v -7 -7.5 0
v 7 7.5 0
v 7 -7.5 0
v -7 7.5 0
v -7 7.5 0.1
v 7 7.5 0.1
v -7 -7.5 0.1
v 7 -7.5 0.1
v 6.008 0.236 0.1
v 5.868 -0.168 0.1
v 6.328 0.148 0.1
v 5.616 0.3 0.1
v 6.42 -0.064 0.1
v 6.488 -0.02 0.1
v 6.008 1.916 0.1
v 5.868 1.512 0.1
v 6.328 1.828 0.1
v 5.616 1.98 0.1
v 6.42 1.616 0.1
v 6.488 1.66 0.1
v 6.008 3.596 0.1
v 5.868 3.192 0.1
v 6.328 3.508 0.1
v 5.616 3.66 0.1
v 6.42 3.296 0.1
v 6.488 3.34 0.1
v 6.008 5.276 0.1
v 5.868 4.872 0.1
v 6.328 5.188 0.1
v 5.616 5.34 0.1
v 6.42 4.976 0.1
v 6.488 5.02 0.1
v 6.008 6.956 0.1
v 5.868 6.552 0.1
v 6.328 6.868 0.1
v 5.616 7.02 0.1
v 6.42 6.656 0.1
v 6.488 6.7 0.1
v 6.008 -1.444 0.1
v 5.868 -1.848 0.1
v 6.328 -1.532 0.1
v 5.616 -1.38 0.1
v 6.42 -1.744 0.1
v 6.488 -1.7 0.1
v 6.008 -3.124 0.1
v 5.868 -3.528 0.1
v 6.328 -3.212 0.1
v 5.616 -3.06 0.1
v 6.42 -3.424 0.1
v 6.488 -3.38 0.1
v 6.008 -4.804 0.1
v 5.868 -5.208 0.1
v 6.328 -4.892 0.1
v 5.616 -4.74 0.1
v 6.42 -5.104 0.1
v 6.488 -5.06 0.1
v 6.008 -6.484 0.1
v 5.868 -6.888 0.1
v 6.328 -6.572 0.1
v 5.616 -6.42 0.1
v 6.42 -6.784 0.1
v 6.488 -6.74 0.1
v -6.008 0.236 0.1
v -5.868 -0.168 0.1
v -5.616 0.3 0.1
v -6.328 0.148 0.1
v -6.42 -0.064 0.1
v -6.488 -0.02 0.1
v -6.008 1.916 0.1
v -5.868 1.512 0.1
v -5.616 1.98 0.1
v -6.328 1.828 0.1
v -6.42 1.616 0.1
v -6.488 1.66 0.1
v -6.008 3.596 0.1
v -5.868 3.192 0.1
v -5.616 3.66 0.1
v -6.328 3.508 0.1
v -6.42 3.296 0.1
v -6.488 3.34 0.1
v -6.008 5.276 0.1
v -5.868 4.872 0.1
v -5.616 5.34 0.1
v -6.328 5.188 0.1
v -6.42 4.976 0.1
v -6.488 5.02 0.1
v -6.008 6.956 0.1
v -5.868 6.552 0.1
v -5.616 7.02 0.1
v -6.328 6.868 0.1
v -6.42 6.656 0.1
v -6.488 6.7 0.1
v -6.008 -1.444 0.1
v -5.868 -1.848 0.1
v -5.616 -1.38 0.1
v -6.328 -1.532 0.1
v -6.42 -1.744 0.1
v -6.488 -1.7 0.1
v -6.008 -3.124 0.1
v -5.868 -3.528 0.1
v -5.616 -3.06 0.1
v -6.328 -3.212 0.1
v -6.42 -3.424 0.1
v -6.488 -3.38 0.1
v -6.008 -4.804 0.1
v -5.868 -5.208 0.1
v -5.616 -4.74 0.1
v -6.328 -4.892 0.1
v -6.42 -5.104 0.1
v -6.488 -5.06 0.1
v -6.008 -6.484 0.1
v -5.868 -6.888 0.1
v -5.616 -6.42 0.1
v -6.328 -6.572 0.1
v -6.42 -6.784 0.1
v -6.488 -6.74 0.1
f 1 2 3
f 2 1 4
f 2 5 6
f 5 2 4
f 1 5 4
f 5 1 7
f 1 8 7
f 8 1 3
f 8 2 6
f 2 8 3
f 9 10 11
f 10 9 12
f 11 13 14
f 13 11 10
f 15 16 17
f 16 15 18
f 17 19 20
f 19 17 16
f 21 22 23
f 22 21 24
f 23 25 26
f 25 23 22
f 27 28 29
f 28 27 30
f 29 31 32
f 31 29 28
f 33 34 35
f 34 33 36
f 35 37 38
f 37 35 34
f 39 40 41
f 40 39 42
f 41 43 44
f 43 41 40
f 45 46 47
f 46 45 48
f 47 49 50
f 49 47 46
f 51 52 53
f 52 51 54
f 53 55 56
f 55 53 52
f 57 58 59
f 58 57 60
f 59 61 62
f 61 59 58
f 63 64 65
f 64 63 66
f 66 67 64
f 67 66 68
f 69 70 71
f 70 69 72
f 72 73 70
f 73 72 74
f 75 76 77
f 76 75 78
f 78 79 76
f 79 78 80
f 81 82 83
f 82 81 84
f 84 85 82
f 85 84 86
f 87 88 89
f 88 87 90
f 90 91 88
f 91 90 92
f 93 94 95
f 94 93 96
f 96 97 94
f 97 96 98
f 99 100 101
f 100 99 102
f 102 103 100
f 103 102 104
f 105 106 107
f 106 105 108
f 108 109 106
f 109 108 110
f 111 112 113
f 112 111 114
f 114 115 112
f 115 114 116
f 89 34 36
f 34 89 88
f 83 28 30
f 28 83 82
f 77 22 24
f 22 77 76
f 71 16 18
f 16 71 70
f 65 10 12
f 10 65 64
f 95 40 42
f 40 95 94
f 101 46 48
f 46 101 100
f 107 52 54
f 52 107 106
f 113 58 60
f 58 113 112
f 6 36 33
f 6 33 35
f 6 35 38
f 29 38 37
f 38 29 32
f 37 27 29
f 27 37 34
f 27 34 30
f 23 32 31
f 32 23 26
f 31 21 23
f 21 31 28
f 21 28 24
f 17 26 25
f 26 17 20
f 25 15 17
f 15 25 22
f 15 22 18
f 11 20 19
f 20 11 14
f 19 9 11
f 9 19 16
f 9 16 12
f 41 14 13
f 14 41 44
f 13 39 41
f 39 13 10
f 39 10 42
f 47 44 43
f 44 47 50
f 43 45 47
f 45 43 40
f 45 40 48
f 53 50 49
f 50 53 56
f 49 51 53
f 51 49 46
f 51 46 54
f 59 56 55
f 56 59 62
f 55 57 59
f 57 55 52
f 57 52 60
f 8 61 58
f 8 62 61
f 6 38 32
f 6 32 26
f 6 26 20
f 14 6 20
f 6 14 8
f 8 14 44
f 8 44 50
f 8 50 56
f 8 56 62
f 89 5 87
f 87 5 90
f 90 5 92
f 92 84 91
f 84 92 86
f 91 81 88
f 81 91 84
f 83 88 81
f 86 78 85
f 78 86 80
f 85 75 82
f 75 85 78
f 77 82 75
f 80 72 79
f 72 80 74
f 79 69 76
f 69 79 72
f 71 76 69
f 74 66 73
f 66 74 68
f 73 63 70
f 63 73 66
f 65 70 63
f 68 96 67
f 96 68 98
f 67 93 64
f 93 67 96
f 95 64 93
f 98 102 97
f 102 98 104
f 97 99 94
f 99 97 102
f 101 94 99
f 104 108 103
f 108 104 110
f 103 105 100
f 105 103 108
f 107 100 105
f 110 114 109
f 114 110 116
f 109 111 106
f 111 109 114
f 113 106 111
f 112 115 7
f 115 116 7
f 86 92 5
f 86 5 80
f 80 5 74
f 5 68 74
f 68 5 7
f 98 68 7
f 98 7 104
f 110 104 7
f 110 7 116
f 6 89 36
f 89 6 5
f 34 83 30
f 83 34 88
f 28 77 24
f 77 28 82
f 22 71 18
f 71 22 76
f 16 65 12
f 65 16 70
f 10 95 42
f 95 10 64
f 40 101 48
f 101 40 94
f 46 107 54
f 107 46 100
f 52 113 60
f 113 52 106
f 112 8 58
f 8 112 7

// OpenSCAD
// file: ../p/box5-12.scad
use <../lib.scad>
function ldraw_lib__box5_12() = [
// 0 Box with 5 Faces without Any Edges
// 0 Name: box5-12.dat
// 0 Author: Chris Dee [cwdee]
// 0 !LDRAW_ORG Primitive UPDATE 2009-02
// 0 !LICENSE Licensed under CC BY 4.0 : see CAreadme.txt
// 
// 0 BFC CERTIFY CCW
  [0,"BFC","CERTIFY"],
  [0,"BFC","CCW"],
// 
// 0 !HISTORY 2009-09-03 [PTadmin] Official Update 2009-02
// 
// 
// 4 16 1 1 1 1 1 -1 -1 1 -1 -1 1 1
  [4,16,1,1,1,1,1,-1,-1,1,-1,-1,1,1],
// 4 16 -1 0 1 1 0 1 1 1 1 -1 1 1
  [4,16,-1,0,1,1,0,1,1,1,1,-1,1,1],
// 4 16 -1 0 -1 -1 0 1 -1 1 1 -1 1 -1
  [4,16,-1,0,-1,-1,0,1,-1,1,1,-1,1,-1],
// 4 16 1 0 -1 -1 0 -1 -1 1 -1 1 1 -1
  [4,16,1,0,-1,-1,0,-1,-1,1,-1,1,1,-1],
// 4 16 1 0 1 1 0 -1 1 1 -1 1 1 1
  [4,16,1,0,1,1,0,-1,1,1,-1,1,1,1],
// 0
];
module ldraw_lib__box5_12(step=0, col=false, unit=2/5, alt=false, line=0.2, solid=!$preview)
    makepoly(ldraw_lib__box5_12(), step=step, col=col, unit=unit, alt=alt, line=line, solid=solid);
ldraw_lib__box5_12(line=0.2);
// main file
use <../lib.scad>
use <../p/box5-12.scad>
function ldraw_lib__6296256f() = [
// 0 Sticker  1.9 x  1.8 with 9 Air Outlet Gills
// 0 Name: 6296256f.dat
// 0 Author: Magnus Forsberg [MagFors]
// 0 !LDRAW_ORG Part UPDATE 2020-03
// 0 !LICENSE Licensed under CC BY 4.0 : see CAreadme.txt
// 
// 0 BFC CERTIFY CCW
  [0,"BFC","CERTIFY"],
  [0,"BFC","CCW"],
// 
// 0 !KEYWORDS 500, Cinquecento, FIAT, Nuova, set 10271
// 
// 0 !HISTORY 2020-12-29 [PTadmin] Official Update 2020-03
// 
// 
// 1 16 0 -.25 0 17.5 0 0 0 .25 0 0 0 18.75 box5-12.dat
  [1,16,0,-.25,0,17.5,0,0,0,.25,0,0,0,18.75, ldraw_lib__box5_12()],
// 4 0 15.02 -.25 .59 14.04 -.25 .75 14.67 -.25 -.42 15.82 -.25 .37
  [4,0,15.02,-.25,.59,14.04,-.25,.75,14.67,-.25,-.42,15.82,-.25,.37],
// 4 0 15.82 -.25 .37 14.67 -.25 -.42 16.05 -.25 -.16 16.22 -.25 -.05
  [4,0,15.82,-.25,.37,14.67,-.25,-.42,16.05,-.25,-.16,16.22,-.25,-.05],
// 4 0 15.02 -.25 4.79 14.04 -.25 4.95 14.67 -.25 3.78 15.82 -.25 4.57
  [4,0,15.02,-.25,4.79,14.04,-.25,4.95,14.67,-.25,3.78,15.82,-.25,4.57],
// 4 0 15.82 -.25 4.57 14.67 -.25 3.78 16.05 -.25 4.04 16.22 -.25 4.15
  [4,0,15.82,-.25,4.57,14.67,-.25,3.78,16.05,-.25,4.04,16.22,-.25,4.15],
// 4 0 15.02 -.25 8.99 14.04 -.25 9.15 14.67 -.25 7.98 15.82 -.25 8.77
  [4,0,15.02,-.25,8.99,14.04,-.25,9.15,14.67,-.25,7.98,15.82,-.25,8.77],
// 4 0 15.82 -.25 8.77 14.67 -.25 7.98 16.05 -.25 8.24 16.22 -.25 8.35
  [4,0,15.82,-.25,8.77,14.67,-.25,7.98,16.05,-.25,8.24,16.22,-.25,8.35],
// 4 0 15.02 -.25 13.19 14.04 -.25 13.35 14.67 -.25 12.18 15.82 -.25 12.97
  [4,0,15.02,-.25,13.19,14.04,-.25,13.35,14.67,-.25,12.18,15.82,-.25,12.97],
// 4 0 15.82 -.25 12.97 14.67 -.25 12.18 16.05 -.25 12.44 16.22 -.25 12.55
  [4,0,15.82,-.25,12.97,14.67,-.25,12.18,16.05,-.25,12.44,16.22,-.25,12.55],
// 4 0 15.02 -.25 17.39 14.04 -.25 17.55 14.67 -.25 16.38 15.82 -.25 17.17
  [4,0,15.02,-.25,17.39,14.04,-.25,17.55,14.67,-.25,16.38,15.82,-.25,17.17],
// 4 0 15.82 -.25 17.17 14.67 -.25 16.38 16.05 -.25 16.64 16.22 -.25 16.75
  [4,0,15.82,-.25,17.17,14.67,-.25,16.38,16.05,-.25,16.64,16.22,-.25,16.75],
// 4 0 15.02 -.25 -3.61 14.04 -.25 -3.45 14.67 -.25 -4.62 15.82 -.25 -3.83
  [4,0,15.02,-.25,-3.61,14.04,-.25,-3.45,14.67,-.25,-4.62,15.82,-.25,-3.83],
// 4 0 15.82 -.25 -3.83 14.67 -.25 -4.62 16.05 -.25 -4.36 16.22 -.25 -4.25
  [4,0,15.82,-.25,-3.83,14.67,-.25,-4.62,16.05,-.25,-4.36,16.22,-.25,-4.25],
// 4 0 15.02 -.25 -7.81 14.04 -.25 -7.65 14.67 -.25 -8.82 15.82 -.25 -8.03
  [4,0,15.02,-.25,-7.81,14.04,-.25,-7.65,14.67,-.25,-8.82,15.82,-.25,-8.03],
// 4 0 15.82 -.25 -8.03 14.67 -.25 -8.82 16.05 -.25 -8.56 16.22 -.25 -8.45
  [4,0,15.82,-.25,-8.03,14.67,-.25,-8.82,16.05,-.25,-8.56,16.22,-.25,-8.45],
// 4 0 15.02 -.25 -12.01 14.04 -.25 -11.85 14.67 -.25 -13.02 15.82 -.25 -12.23
  [4,0,15.02,-.25,-12.01,14.04,-.25,-11.85,14.67,-.25,-13.02,15.82,-.25,-12.23],
// 4 0 15.82 -.25 -12.23 14.67 -.25 -13.02 16.05 -.25 -12.76 16.22 -.25 -12.65
  [4,0,15.82,-.25,-12.23,14.67,-.25,-13.02,16.05,-.25,-12.76,16.22,-.25,-12.65],
// 4 0 15.02 -.25 -16.21 14.04 -.25 -16.05 14.67 -.25 -17.22 15.82 -.25 -16.43
  [4,0,15.02,-.25,-16.21,14.04,-.25,-16.05,14.67,-.25,-17.22,15.82,-.25,-16.43],
// 4 0 15.82 -.25 -16.43 14.67 -.25 -17.22 16.05 -.25 -16.96 16.22 -.25 -16.85
  [4,0,15.82,-.25,-16.43,14.67,-.25,-17.22,16.05,-.25,-16.96,16.22,-.25,-16.85],
// 4 0 -14.67 -.25 -.42 -14.04 -.25 .75 -15.02 -.25 .59 -15.82 -.25 .37
  [4,0,-14.67,-.25,-.42,-14.04,-.25,.75,-15.02,-.25,.59,-15.82,-.25,.37],
// 4 0 -16.05 -.25 -.16 -14.67 -.25 -.42 -15.82 -.25 .37 -16.22 -.25 -.05
  [4,0,-16.05,-.25,-.16,-14.67,-.25,-.42,-15.82,-.25,.37,-16.22,-.25,-.05],
// 4 0 -14.67 -.25 3.78 -14.04 -.25 4.95 -15.02 -.25 4.79 -15.82 -.25 4.57
  [4,0,-14.67,-.25,3.78,-14.04,-.25,4.95,-15.02,-.25,4.79,-15.82,-.25,4.57],
// 4 0 -16.05 -.25 4.04 -14.67 -.25 3.78 -15.82 -.25 4.57 -16.22 -.25 4.15
  [4,0,-16.05,-.25,4.04,-14.67,-.25,3.78,-15.82,-.25,4.57,-16.22,-.25,4.15],
// 4 0 -14.67 -.25 7.98 -14.04 -.25 9.15 -15.02 -.25 8.99 -15.82 -.25 8.77
  [4,0,-14.67,-.25,7.98,-14.04,-.25,9.15,-15.02,-.25,8.99,-15.82,-.25,8.77],
// 4 0 -16.05 -.25 8.24 -14.67 -.25 7.98 -15.82 -.25 8.77 -16.22 -.25 8.35
  [4,0,-16.05,-.25,8.24,-14.67,-.25,7.98,-15.82,-.25,8.77,-16.22,-.25,8.35],
// 4 0 -14.67 -.25 12.18 -14.04 -.25 13.35 -15.02 -.25 13.19 -15.82 -.25 12.97
  [4,0,-14.67,-.25,12.18,-14.04,-.25,13.35,-15.02,-.25,13.19,-15.82,-.25,12.97],
// 4 0 -16.05 -.25 12.44 -14.67 -.25 12.18 -15.82 -.25 12.97 -16.22 -.25 12.55
  [4,0,-16.05,-.25,12.44,-14.67,-.25,12.18,-15.82,-.25,12.97,-16.22,-.25,12.55],
// 4 0 -14.67 -.25 16.38 -14.04 -.25 17.55 -15.02 -.25 17.39 -15.82 -.25 17.17
  [4,0,-14.67,-.25,16.38,-14.04,-.25,17.55,-15.02,-.25,17.39,-15.82,-.25,17.17],
// 4 0 -16.05 -.25 16.64 -14.67 -.25 16.38 -15.82 -.25 17.17 -16.22 -.25 16.75
  [4,0,-16.05,-.25,16.64,-14.67,-.25,16.38,-15.82,-.25,17.17,-16.22,-.25,16.75],
// 4 0 -14.67 -.25 -4.62 -14.04 -.25 -3.45 -15.02 -.25 -3.61 -15.82 -.25 -3.83
  [4,0,-14.67,-.25,-4.62,-14.04,-.25,-3.45,-15.02,-.25,-3.61,-15.82,-.25,-3.83],
// 4 0 -16.05 -.25 -4.36 -14.67 -.25 -4.62 -15.82 -.25 -3.83 -16.22 -.25 -4.25
  [4,0,-16.05,-.25,-4.36,-14.67,-.25,-4.62,-15.82,-.25,-3.83,-16.22,-.25,-4.25],
// 4 0 -14.67 -.25 -8.82 -14.04 -.25 -7.65 -15.02 -.25 -7.81 -15.82 -.25 -8.03
  [4,0,-14.67,-.25,-8.82,-14.04,-.25,-7.65,-15.02,-.25,-7.81,-15.82,-.25,-8.03],
// 4 0 -16.05 -.25 -8.56 -14.67 -.25 -8.82 -15.82 -.25 -8.03 -16.22 -.25 -8.45
  [4,0,-16.05,-.25,-8.56,-14.67,-.25,-8.82,-15.82,-.25,-8.03,-16.22,-.25,-8.45],
// 4 0 -14.67 -.25 -13.02 -14.04 -.25 -11.85 -15.02 -.25 -12.01 -15.82 -.25 -12.23
  [4,0,-14.67,-.25,-13.02,-14.04,-.25,-11.85,-15.02,-.25,-12.01,-15.82,-.25,-12.23],
// 4 0 -16.05 -.25 -12.76 -14.67 -.25 -13.02 -15.82 -.25 -12.23 -16.22 -.25 -12.65
  [4,0,-16.05,-.25,-12.76,-14.67,-.25,-13.02,-15.82,-.25,-12.23,-16.22,-.25,-12.65],
// 4 0 -14.67 -.25 -17.22 -14.04 -.25 -16.05 -15.02 -.25 -16.21 -15.82 -.25 -16.43
  [4,0,-14.67,-.25,-17.22,-14.04,-.25,-16.05,-15.02,-.25,-16.21,-15.82,-.25,-16.43],
// 4 0 -16.05 -.25 -16.96 -14.67 -.25 -17.22 -15.82 -.25 -16.43 -16.22 -.25 -16.85
  [4,0,-16.05,-.25,-16.96,-14.67,-.25,-17.22,-15.82,-.25,-16.43,-16.22,-.25,-16.85],
// 4 0 -14.67 -.25 16.38 14.67 -.25 16.38 14.04 -.25 17.55 -14.04 -.25 17.55
  [4,0,-14.67,-.25,16.38,14.67,-.25,16.38,14.04,-.25,17.55,-14.04,-.25,17.55],
// 4 0 14.04 -.25 13.35 -14.04 -.25 13.35 -14.67 -.25 12.18 14.67 -.25 12.18
  [4,0,14.04,-.25,13.35,-14.04,-.25,13.35,-14.67,-.25,12.18,14.67,-.25,12.18],
// 4 0 14.04 -.25 9.15 -14.04 -.25 9.15 -14.67 -.25 7.98 14.67 -.25 7.98
  [4,0,14.04,-.25,9.15,-14.04,-.25,9.15,-14.67,-.25,7.98,14.67,-.25,7.98],
// 4 0 14.04 -.25 4.95 -14.04 -.25 4.95 -14.67 -.25 3.78 14.67 -.25 3.78
  [4,0,14.04,-.25,4.95,-14.04,-.25,4.95,-14.67,-.25,3.78,14.67,-.25,3.78],
// 4 0 14.04 -.25 .75 -14.04 -.25 .75 -14.67 -.25 -.42 14.67 -.25 -.42
  [4,0,14.04,-.25,.75,-14.04,-.25,.75,-14.67,-.25,-.42,14.67,-.25,-.42],
// 4 0 14.04 -.25 -3.45 -14.04 -.25 -3.45 -14.67 -.25 -4.62 14.67 -.25 -4.62
  [4,0,14.04,-.25,-3.45,-14.04,-.25,-3.45,-14.67,-.25,-4.62,14.67,-.25,-4.62],
// 4 0 14.04 -.25 -7.65 -14.04 -.25 -7.65 -14.67 -.25 -8.82 14.67 -.25 -8.82
  [4,0,14.04,-.25,-7.65,-14.04,-.25,-7.65,-14.67,-.25,-8.82,14.67,-.25,-8.82],
// 4 0 14.04 -.25 -11.85 -14.04 -.25 -11.85 -14.67 -.25 -13.02 14.67 -.25 -13.02
  [4,0,14.04,-.25,-11.85,-14.04,-.25,-11.85,-14.67,-.25,-13.02,14.67,-.25,-13.02],
// 4 0 14.04 -.25 -16.05 -14.04 -.25 -16.05 -14.67 -.25 -17.22 14.67 -.25 -17.22
  [4,0,14.04,-.25,-16.05,-14.04,-.25,-16.05,-14.67,-.25,-17.22,14.67,-.25,-17.22],
// 3 226 17.5 -.25 18.75 14.04 -.25 17.55 15.02 -.25 17.39
  [3,226,17.5,-.25,18.75,14.04,-.25,17.55,15.02,-.25,17.39],
// 3 226 17.5 -.25 18.75 15.02 -.25 17.39 15.82 -.25 17.17
  [3,226,17.5,-.25,18.75,15.02,-.25,17.39,15.82,-.25,17.17],
// 3 226 17.5 -.25 18.75 15.82 -.25 17.17 16.22 -.25 16.75
  [3,226,17.5,-.25,18.75,15.82,-.25,17.17,16.22,-.25,16.75],
// 4 226 16.22 -.25 16.75 16.05 -.25 16.64 15.82 -.25 12.97 16.22 -.25 12.55
  [4,226,16.22,-.25,16.75,16.05,-.25,16.64,15.82,-.25,12.97,16.22,-.25,12.55],
// 4 226 16.05 -.25 16.64 14.67 -.25 16.38 15.02 -.25 13.19 15.82 -.25 12.97
  [4,226,16.05,-.25,16.64,14.67,-.25,16.38,15.02,-.25,13.19,15.82,-.25,12.97],
// 3 226 15.02 -.25 13.19 14.67 -.25 16.38 14.04 -.25 13.35
  [3,226,15.02,-.25,13.19,14.67,-.25,16.38,14.04,-.25,13.35],
// 4 226 15.82 -.25 8.77 16.22 -.25 8.35 16.22 -.25 12.55 16.05 -.25 12.44
  [4,226,15.82,-.25,8.77,16.22,-.25,8.35,16.22,-.25,12.55,16.05,-.25,12.44],
// 4 226 15.02 -.25 8.99 15.82 -.25 8.77 16.05 -.25 12.44 14.67 -.25 12.18
  [4,226,15.02,-.25,8.99,15.82,-.25,8.77,16.05,-.25,12.44,14.67,-.25,12.18],
// 3 226 15.02 -.25 8.99 14.67 -.25 12.18 14.04 -.25 9.15
  [3,226,15.02,-.25,8.99,14.67,-.25,12.18,14.04,-.25,9.15],
// 4 226 15.82 -.25 4.57 16.22 -.25 4.15 16.22 -.25 8.35 16.05 -.25 8.24
  [4,226,15.82,-.25,4.57,16.22,-.25,4.15,16.22,-.25,8.35,16.05,-.25,8.24],
// 4 226 15.02 -.25 4.79 15.82 -.25 4.57 16.05 -.25 8.24 14.67 -.25 7.98
  [4,226,15.02,-.25,4.79,15.82,-.25,4.57,16.05,-.25,8.24,14.67,-.25,7.98],
// 3 226 15.02 -.25 4.79 14.67 -.25 7.98 14.04 -.25 4.95
  [3,226,15.02,-.25,4.79,14.67,-.25,7.98,14.04,-.25,4.95],
// 4 226 15.82 -.25 .37 16.22 -.25 -.05 16.22 -.25 4.15 16.05 -.25 4.04
  [4,226,15.82,-.25,.37,16.22,-.25,-.05,16.22,-.25,4.15,16.05,-.25,4.04],
// 4 226 15.02 -.25 .59 15.82 -.25 .37 16.05 -.25 4.04 14.67 -.25 3.78
  [4,226,15.02,-.25,.59,15.82,-.25,.37,16.05,-.25,4.04,14.67,-.25,3.78],
// 3 226 15.02 -.25 .59 14.67 -.25 3.78 14.04 -.25 .75
  [3,226,15.02,-.25,.59,14.67,-.25,3.78,14.04,-.25,.75],
// 4 226 15.82 -.25 -3.83 16.22 -.25 -4.25 16.22 -.25 -.05 16.05 -.25 -.16
  [4,226,15.82,-.25,-3.83,16.22,-.25,-4.25,16.22,-.25,-.05,16.05,-.25,-.16],
// 4 226 15.02 -.25 -3.61 15.82 -.25 -3.83 16.05 -.25 -.16 14.67 -.25 -.42
  [4,226,15.02,-.25,-3.61,15.82,-.25,-3.83,16.05,-.25,-.16,14.67,-.25,-.42],
// 3 226 15.02 -.25 -3.61 14.67 -.25 -.42 14.04 -.25 -3.45
  [3,226,15.02,-.25,-3.61,14.67,-.25,-.42,14.04,-.25,-3.45],
// 4 226 15.82 -.25 -8.03 16.22 -.25 -8.45 16.22 -.25 -4.25 16.05 -.25 -4.36
  [4,226,15.82,-.25,-8.03,16.22,-.25,-8.45,16.22,-.25,-4.25,16.05,-.25,-4.36],
// 4 226 15.02 -.25 -7.81 15.82 -.25 -8.03 16.05 -.25 -4.36 14.67 -.25 -4.62
  [4,226,15.02,-.25,-7.81,15.82,-.25,-8.03,16.05,-.25,-4.36,14.67,-.25,-4.62],
// 3 226 15.02 -.25 -7.81 14.67 -.25 -4.62 14.04 -.25 -7.65
  [3,226,15.02,-.25,-7.81,14.67,-.25,-4.62,14.04,-.25,-7.65],
// 4 226 15.82 -.25 -12.23 16.22 -.25 -12.65 16.22 -.25 -8.45 16.05 -.25 -8.56
  [4,226,15.82,-.25,-12.23,16.22,-.25,-12.65,16.22,-.25,-8.45,16.05,-.25,-8.56],
// 4 226 15.02 -.25 -12.01 15.82 -.25 -12.23 16.05 -.25 -8.56 14.67 -.25 -8.82
  [4,226,15.02,-.25,-12.01,15.82,-.25,-12.23,16.05,-.25,-8.56,14.67,-.25,-8.82],
// 3 226 15.02 -.25 -12.01 14.67 -.25 -8.82 14.04 -.25 -11.85
  [3,226,15.02,-.25,-12.01,14.67,-.25,-8.82,14.04,-.25,-11.85],
// 4 226 15.82 -.25 -16.43 16.22 -.25 -16.85 16.22 -.25 -12.65 16.05 -.25 -12.76
  [4,226,15.82,-.25,-16.43,16.22,-.25,-16.85,16.22,-.25,-12.65,16.05,-.25,-12.76],
// 4 226 15.02 -.25 -16.21 15.82 -.25 -16.43 16.05 -.25 -12.76 14.67 -.25 -13.02
  [4,226,15.02,-.25,-16.21,15.82,-.25,-16.43,16.05,-.25,-12.76,14.67,-.25,-13.02],
// 3 226 15.02 -.25 -16.21 14.67 -.25 -13.02 14.04 -.25 -16.05
  [3,226,15.02,-.25,-16.21,14.67,-.25,-13.02,14.04,-.25,-16.05],
// 3 226 17.5 -.25 -18.75 16.05 -.25 -16.96 14.67 -.25 -17.22
  [3,226,17.5,-.25,-18.75,16.05,-.25,-16.96,14.67,-.25,-17.22],
// 3 226 17.5 -.25 -18.75 16.22 -.25 -16.85 16.05 -.25 -16.96
  [3,226,17.5,-.25,-18.75,16.22,-.25,-16.85,16.05,-.25,-16.96],
// 3 226 17.5 -.25 18.75 16.22 -.25 16.75 16.22 -.25 12.55
  [3,226,17.5,-.25,18.75,16.22,-.25,16.75,16.22,-.25,12.55],
// 3 226 17.5 -.25 18.75 16.22 -.25 12.55 16.22 -.25 8.35
  [3,226,17.5,-.25,18.75,16.22,-.25,12.55,16.22,-.25,8.35],
// 3 226 17.5 -.25 18.75 16.22 -.25 8.35 16.22 -.25 4.15
  [3,226,17.5,-.25,18.75,16.22,-.25,8.35,16.22,-.25,4.15],
// 4 226 17.5 -.25 18.75 16.22 -.25 4.15 16.22 -.25 -.05 17.5 -.25 -18.75
  [4,226,17.5,-.25,18.75,16.22,-.25,4.15,16.22,-.25,-.05,17.5,-.25,-18.75],
// 3 226 17.5 -.25 -18.75 16.22 -.25 -.05 16.22 -.25 -4.25
  [3,226,17.5,-.25,-18.75,16.22,-.25,-.05,16.22,-.25,-4.25],
// 3 226 17.5 -.25 -18.75 16.22 -.25 -4.25 16.22 -.25 -8.45
  [3,226,17.5,-.25,-18.75,16.22,-.25,-4.25,16.22,-.25,-8.45],
// 3 226 17.5 -.25 -18.75 16.22 -.25 -8.45 16.22 -.25 -12.65
  [3,226,17.5,-.25,-18.75,16.22,-.25,-8.45,16.22,-.25,-12.65],
// 3 226 17.5 -.25 -18.75 16.22 -.25 -12.65 16.22 -.25 -16.85
  [3,226,17.5,-.25,-18.75,16.22,-.25,-12.65,16.22,-.25,-16.85],
// 3 226 -14.04 -.25 17.55 -17.5 -.25 18.75 -15.02 -.25 17.39
  [3,226,-14.04,-.25,17.55,-17.5,-.25,18.75,-15.02,-.25,17.39],
// 3 226 -15.02 -.25 17.39 -17.5 -.25 18.75 -15.82 -.25 17.17
  [3,226,-15.02,-.25,17.39,-17.5,-.25,18.75,-15.82,-.25,17.17],
// 3 226 -15.82 -.25 17.17 -17.5 -.25 18.75 -16.22 -.25 16.75
  [3,226,-15.82,-.25,17.17,-17.5,-.25,18.75,-16.22,-.25,16.75],
// 4 226 -15.82 -.25 12.97 -16.05 -.25 16.64 -16.22 -.25 16.75 -16.22 -.25 12.55
  [4,226,-15.82,-.25,12.97,-16.05,-.25,16.64,-16.22,-.25,16.75,-16.22,-.25,12.55],
// 4 226 -15.02 -.25 13.19 -14.67 -.25 16.38 -16.05 -.25 16.64 -15.82 -.25 12.97
  [4,226,-15.02,-.25,13.19,-14.67,-.25,16.38,-16.05,-.25,16.64,-15.82,-.25,12.97],
// 3 226 -14.04 -.25 13.35 -14.67 -.25 16.38 -15.02 -.25 13.19
  [3,226,-14.04,-.25,13.35,-14.67,-.25,16.38,-15.02,-.25,13.19],
// 4 226 -16.22 -.25 12.55 -16.22 -.25 8.35 -15.82 -.25 8.77 -16.05 -.25 12.44
  [4,226,-16.22,-.25,12.55,-16.22,-.25,8.35,-15.82,-.25,8.77,-16.05,-.25,12.44],
// 4 226 -16.05 -.25 12.44 -15.82 -.25 8.77 -15.02 -.25 8.99 -14.67 -.25 12.18
  [4,226,-16.05,-.25,12.44,-15.82,-.25,8.77,-15.02,-.25,8.99,-14.67,-.25,12.18],
// 3 226 -14.04 -.25 9.15 -14.67 -.25 12.18 -15.02 -.25 8.99
  [3,226,-14.04,-.25,9.15,-14.67,-.25,12.18,-15.02,-.25,8.99],
// 4 226 -16.22 -.25 8.35 -16.22 -.25 4.15 -15.82 -.25 4.57 -16.05 -.25 8.24
  [4,226,-16.22,-.25,8.35,-16.22,-.25,4.15,-15.82,-.25,4.57,-16.05,-.25,8.24],
// 4 226 -16.05 -.25 8.24 -15.82 -.25 4.57 -15.02 -.25 4.79 -14.67 -.25 7.98
  [4,226,-16.05,-.25,8.24,-15.82,-.25,4.57,-15.02,-.25,4.79,-14.67,-.25,7.98],
// 3 226 -14.04 -.25 4.95 -14.67 -.25 7.98 -15.02 -.25 4.79
  [3,226,-14.04,-.25,4.95,-14.67,-.25,7.98,-15.02,-.25,4.79],
// 4 226 -16.22 -.25 4.15 -16.22 -.25 -.05 -15.82 -.25 .37 -16.05 -.25 4.04
  [4,226,-16.22,-.25,4.15,-16.22,-.25,-.05,-15.82,-.25,.37,-16.05,-.25,4.04],
// 4 226 -16.05 -.25 4.04 -15.82 -.25 .37 -15.02 -.25 .59 -14.67 -.25 3.78
  [4,226,-16.05,-.25,4.04,-15.82,-.25,.37,-15.02,-.25,.59,-14.67,-.25,3.78],
// 3 226 -14.04 -.25 .75 -14.67 -.25 3.78 -15.02 -.25 .59
  [3,226,-14.04,-.25,.75,-14.67,-.25,3.78,-15.02,-.25,.59],
// 4 226 -16.22 -.25 -.05 -16.22 -.25 -4.25 -15.82 -.25 -3.83 -16.05 -.25 -.16
  [4,226,-16.22,-.25,-.05,-16.22,-.25,-4.25,-15.82,-.25,-3.83,-16.05,-.25,-.16],
// 4 226 -16.05 -.25 -.16 -15.82 -.25 -3.83 -15.02 -.25 -3.61 -14.67 -.25 -.42
  [4,226,-16.05,-.25,-.16,-15.82,-.25,-3.83,-15.02,-.25,-3.61,-14.67,-.25,-.42],
// 3 226 -14.04 -.25 -3.45 -14.67 -.25 -.42 -15.02 -.25 -3.61
  [3,226,-14.04,-.25,-3.45,-14.67,-.25,-.42,-15.02,-.25,-3.61],
// 4 226 -16.22 -.25 -4.25 -16.22 -.25 -8.45 -15.82 -.25 -8.03 -16.05 -.25 -4.36
  [4,226,-16.22,-.25,-4.25,-16.22,-.25,-8.45,-15.82,-.25,-8.03,-16.05,-.25,-4.36],
// 4 226 -16.05 -.25 -4.36 -15.82 -.25 -8.03 -15.02 -.25 -7.81 -14.67 -.25 -4.62
  [4,226,-16.05,-.25,-4.36,-15.82,-.25,-8.03,-15.02,-.25,-7.81,-14.67,-.25,-4.62],
// 3 226 -14.04 -.25 -7.65 -14.67 -.25 -4.62 -15.02 -.25 -7.81
  [3,226,-14.04,-.25,-7.65,-14.67,-.25,-4.62,-15.02,-.25,-7.81],
// 4 226 -16.22 -.25 -8.45 -16.22 -.25 -12.65 -15.82 -.25 -12.23 -16.05 -.25 -8.56
  [4,226,-16.22,-.25,-8.45,-16.22,-.25,-12.65,-15.82,-.25,-12.23,-16.05,-.25,-8.56],
// 4 226 -16.05 -.25 -8.56 -15.82 -.25 -12.23 -15.02 -.25 -12.01 -14.67 -.25 -8.82
  [4,226,-16.05,-.25,-8.56,-15.82,-.25,-12.23,-15.02,-.25,-12.01,-14.67,-.25,-8.82],
// 3 226 -14.04 -.25 -11.85 -14.67 -.25 -8.82 -15.02 -.25 -12.01
  [3,226,-14.04,-.25,-11.85,-14.67,-.25,-8.82,-15.02,-.25,-12.01],
// 4 226 -16.22 -.25 -12.65 -16.22 -.25 -16.85 -15.82 -.25 -16.43 -16.05 -.25 -12.76
  [4,226,-16.22,-.25,-12.65,-16.22,-.25,-16.85,-15.82,-.25,-16.43,-16.05,-.25,-12.76],
// 4 226 -16.05 -.25 -12.76 -15.82 -.25 -16.43 -15.02 -.25 -16.21 -14.67 -.25 -13.02
  [4,226,-16.05,-.25,-12.76,-15.82,-.25,-16.43,-15.02,-.25,-16.21,-14.67,-.25,-13.02],
// 3 226 -14.04 -.25 -16.05 -14.67 -.25 -13.02 -15.02 -.25 -16.21
  [3,226,-14.04,-.25,-16.05,-14.67,-.25,-13.02,-15.02,-.25,-16.21],
// 3 226 -14.67 -.25 -17.22 -16.05 -.25 -16.96 -17.5 -.25 -18.75
  [3,226,-14.67,-.25,-17.22,-16.05,-.25,-16.96,-17.5,-.25,-18.75],
// 3 226 -16.05 -.25 -16.96 -16.22 -.25 -16.85 -17.5 -.25 -18.75
  [3,226,-16.05,-.25,-16.96,-16.22,-.25,-16.85,-17.5,-.25,-18.75],
// 3 226 -16.22 -.25 12.55 -16.22 -.25 16.75 -17.5 -.25 18.75
  [3,226,-16.22,-.25,12.55,-16.22,-.25,16.75,-17.5,-.25,18.75],
// 3 226 -16.22 -.25 12.55 -17.5 -.25 18.75 -16.22 -.25 8.35
  [3,226,-16.22,-.25,12.55,-17.5,-.25,18.75,-16.22,-.25,8.35],
// 3 226 -16.22 -.25 8.35 -17.5 -.25 18.75 -16.22 -.25 4.15
  [3,226,-16.22,-.25,8.35,-17.5,-.25,18.75,-16.22,-.25,4.15],
// 4 226 -16.22 -.25 -.05 -16.22 -.25 4.15 -17.5 -.25 18.75 -17.5 -.25 -18.75
  [4,226,-16.22,-.25,-.05,-16.22,-.25,4.15,-17.5,-.25,18.75,-17.5,-.25,-18.75],
// 3 226 -16.22 -.25 -4.25 -16.22 -.25 -.05 -17.5 -.25 -18.75
  [3,226,-16.22,-.25,-4.25,-16.22,-.25,-.05,-17.5,-.25,-18.75],
// 3 226 -16.22 -.25 -4.25 -17.5 -.25 -18.75 -16.22 -.25 -8.45
  [3,226,-16.22,-.25,-4.25,-17.5,-.25,-18.75,-16.22,-.25,-8.45],
// 3 226 -16.22 -.25 -12.65 -16.22 -.25 -8.45 -17.5 -.25 -18.75
  [3,226,-16.22,-.25,-12.65,-16.22,-.25,-8.45,-17.5,-.25,-18.75],
// 3 226 -16.22 -.25 -12.65 -17.5 -.25 -18.75 -16.22 -.25 -16.85
  [3,226,-16.22,-.25,-12.65,-17.5,-.25,-18.75,-16.22,-.25,-16.85],
// 4 226 -14.04 -.25 17.55 14.04 -.25 17.55 17.5 -.25 18.75 -17.5 -.25 18.75
  [4,226,-14.04,-.25,17.55,14.04,-.25,17.55,17.5,-.25,18.75,-17.5,-.25,18.75],
// 4 226 -14.67 -.25 16.38 -14.04 -.25 13.35 14.04 -.25 13.35 14.67 -.25 16.38
  [4,226,-14.67,-.25,16.38,-14.04,-.25,13.35,14.04,-.25,13.35,14.67,-.25,16.38],
// 4 226 14.04 -.25 9.15 14.67 -.25 12.18 -14.67 -.25 12.18 -14.04 -.25 9.15
  [4,226,14.04,-.25,9.15,14.67,-.25,12.18,-14.67,-.25,12.18,-14.04,-.25,9.15],
// 4 226 14.04 -.25 4.95 14.67 -.25 7.98 -14.67 -.25 7.98 -14.04 -.25 4.95
  [4,226,14.04,-.25,4.95,14.67,-.25,7.98,-14.67,-.25,7.98,-14.04,-.25,4.95],
// 4 226 14.04 -.25 .75 14.67 -.25 3.78 -14.67 -.25 3.78 -14.04 -.25 .75
  [4,226,14.04,-.25,.75,14.67,-.25,3.78,-14.67,-.25,3.78,-14.04,-.25,.75],
// 4 226 14.04 -.25 -3.45 14.67 -.25 -.42 -14.67 -.25 -.42 -14.04 -.25 -3.45
  [4,226,14.04,-.25,-3.45,14.67,-.25,-.42,-14.67,-.25,-.42,-14.04,-.25,-3.45],
// 4 226 14.04 -.25 -7.65 14.67 -.25 -4.62 -14.67 -.25 -4.62 -14.04 -.25 -7.65
  [4,226,14.04,-.25,-7.65,14.67,-.25,-4.62,-14.67,-.25,-4.62,-14.04,-.25,-7.65],
// 4 226 14.04 -.25 -11.85 14.67 -.25 -8.82 -14.67 -.25 -8.82 -14.04 -.25 -11.85
  [4,226,14.04,-.25,-11.85,14.67,-.25,-8.82,-14.67,-.25,-8.82,-14.04,-.25,-11.85],
// 4 226 14.04 -.25 -16.05 14.67 -.25 -13.02 -14.67 -.25 -13.02 -14.04 -.25 -16.05
  [4,226,14.04,-.25,-16.05,14.67,-.25,-13.02,-14.67,-.25,-13.02,-14.04,-.25,-16.05],
// 4 226 17.5 -.25 -18.75 14.67 -.25 -17.22 -14.67 -.25 -17.22 -17.5 -.25 -18.75
  [4,226,17.5,-.25,-18.75,14.67,-.25,-17.22,-14.67,-.25,-17.22,-17.5,-.25,-18.75],
];
module ldraw_lib__6296256f(step=0, col=false, unit=2/5, alt=false, line=0.2, solid=!$preview)
    makepoly(ldraw_lib__6296256f(), step=step, col=col, unit=unit, alt=alt, line=line, solid=solid);
ldraw_lib__6296256f(line=0.2);
